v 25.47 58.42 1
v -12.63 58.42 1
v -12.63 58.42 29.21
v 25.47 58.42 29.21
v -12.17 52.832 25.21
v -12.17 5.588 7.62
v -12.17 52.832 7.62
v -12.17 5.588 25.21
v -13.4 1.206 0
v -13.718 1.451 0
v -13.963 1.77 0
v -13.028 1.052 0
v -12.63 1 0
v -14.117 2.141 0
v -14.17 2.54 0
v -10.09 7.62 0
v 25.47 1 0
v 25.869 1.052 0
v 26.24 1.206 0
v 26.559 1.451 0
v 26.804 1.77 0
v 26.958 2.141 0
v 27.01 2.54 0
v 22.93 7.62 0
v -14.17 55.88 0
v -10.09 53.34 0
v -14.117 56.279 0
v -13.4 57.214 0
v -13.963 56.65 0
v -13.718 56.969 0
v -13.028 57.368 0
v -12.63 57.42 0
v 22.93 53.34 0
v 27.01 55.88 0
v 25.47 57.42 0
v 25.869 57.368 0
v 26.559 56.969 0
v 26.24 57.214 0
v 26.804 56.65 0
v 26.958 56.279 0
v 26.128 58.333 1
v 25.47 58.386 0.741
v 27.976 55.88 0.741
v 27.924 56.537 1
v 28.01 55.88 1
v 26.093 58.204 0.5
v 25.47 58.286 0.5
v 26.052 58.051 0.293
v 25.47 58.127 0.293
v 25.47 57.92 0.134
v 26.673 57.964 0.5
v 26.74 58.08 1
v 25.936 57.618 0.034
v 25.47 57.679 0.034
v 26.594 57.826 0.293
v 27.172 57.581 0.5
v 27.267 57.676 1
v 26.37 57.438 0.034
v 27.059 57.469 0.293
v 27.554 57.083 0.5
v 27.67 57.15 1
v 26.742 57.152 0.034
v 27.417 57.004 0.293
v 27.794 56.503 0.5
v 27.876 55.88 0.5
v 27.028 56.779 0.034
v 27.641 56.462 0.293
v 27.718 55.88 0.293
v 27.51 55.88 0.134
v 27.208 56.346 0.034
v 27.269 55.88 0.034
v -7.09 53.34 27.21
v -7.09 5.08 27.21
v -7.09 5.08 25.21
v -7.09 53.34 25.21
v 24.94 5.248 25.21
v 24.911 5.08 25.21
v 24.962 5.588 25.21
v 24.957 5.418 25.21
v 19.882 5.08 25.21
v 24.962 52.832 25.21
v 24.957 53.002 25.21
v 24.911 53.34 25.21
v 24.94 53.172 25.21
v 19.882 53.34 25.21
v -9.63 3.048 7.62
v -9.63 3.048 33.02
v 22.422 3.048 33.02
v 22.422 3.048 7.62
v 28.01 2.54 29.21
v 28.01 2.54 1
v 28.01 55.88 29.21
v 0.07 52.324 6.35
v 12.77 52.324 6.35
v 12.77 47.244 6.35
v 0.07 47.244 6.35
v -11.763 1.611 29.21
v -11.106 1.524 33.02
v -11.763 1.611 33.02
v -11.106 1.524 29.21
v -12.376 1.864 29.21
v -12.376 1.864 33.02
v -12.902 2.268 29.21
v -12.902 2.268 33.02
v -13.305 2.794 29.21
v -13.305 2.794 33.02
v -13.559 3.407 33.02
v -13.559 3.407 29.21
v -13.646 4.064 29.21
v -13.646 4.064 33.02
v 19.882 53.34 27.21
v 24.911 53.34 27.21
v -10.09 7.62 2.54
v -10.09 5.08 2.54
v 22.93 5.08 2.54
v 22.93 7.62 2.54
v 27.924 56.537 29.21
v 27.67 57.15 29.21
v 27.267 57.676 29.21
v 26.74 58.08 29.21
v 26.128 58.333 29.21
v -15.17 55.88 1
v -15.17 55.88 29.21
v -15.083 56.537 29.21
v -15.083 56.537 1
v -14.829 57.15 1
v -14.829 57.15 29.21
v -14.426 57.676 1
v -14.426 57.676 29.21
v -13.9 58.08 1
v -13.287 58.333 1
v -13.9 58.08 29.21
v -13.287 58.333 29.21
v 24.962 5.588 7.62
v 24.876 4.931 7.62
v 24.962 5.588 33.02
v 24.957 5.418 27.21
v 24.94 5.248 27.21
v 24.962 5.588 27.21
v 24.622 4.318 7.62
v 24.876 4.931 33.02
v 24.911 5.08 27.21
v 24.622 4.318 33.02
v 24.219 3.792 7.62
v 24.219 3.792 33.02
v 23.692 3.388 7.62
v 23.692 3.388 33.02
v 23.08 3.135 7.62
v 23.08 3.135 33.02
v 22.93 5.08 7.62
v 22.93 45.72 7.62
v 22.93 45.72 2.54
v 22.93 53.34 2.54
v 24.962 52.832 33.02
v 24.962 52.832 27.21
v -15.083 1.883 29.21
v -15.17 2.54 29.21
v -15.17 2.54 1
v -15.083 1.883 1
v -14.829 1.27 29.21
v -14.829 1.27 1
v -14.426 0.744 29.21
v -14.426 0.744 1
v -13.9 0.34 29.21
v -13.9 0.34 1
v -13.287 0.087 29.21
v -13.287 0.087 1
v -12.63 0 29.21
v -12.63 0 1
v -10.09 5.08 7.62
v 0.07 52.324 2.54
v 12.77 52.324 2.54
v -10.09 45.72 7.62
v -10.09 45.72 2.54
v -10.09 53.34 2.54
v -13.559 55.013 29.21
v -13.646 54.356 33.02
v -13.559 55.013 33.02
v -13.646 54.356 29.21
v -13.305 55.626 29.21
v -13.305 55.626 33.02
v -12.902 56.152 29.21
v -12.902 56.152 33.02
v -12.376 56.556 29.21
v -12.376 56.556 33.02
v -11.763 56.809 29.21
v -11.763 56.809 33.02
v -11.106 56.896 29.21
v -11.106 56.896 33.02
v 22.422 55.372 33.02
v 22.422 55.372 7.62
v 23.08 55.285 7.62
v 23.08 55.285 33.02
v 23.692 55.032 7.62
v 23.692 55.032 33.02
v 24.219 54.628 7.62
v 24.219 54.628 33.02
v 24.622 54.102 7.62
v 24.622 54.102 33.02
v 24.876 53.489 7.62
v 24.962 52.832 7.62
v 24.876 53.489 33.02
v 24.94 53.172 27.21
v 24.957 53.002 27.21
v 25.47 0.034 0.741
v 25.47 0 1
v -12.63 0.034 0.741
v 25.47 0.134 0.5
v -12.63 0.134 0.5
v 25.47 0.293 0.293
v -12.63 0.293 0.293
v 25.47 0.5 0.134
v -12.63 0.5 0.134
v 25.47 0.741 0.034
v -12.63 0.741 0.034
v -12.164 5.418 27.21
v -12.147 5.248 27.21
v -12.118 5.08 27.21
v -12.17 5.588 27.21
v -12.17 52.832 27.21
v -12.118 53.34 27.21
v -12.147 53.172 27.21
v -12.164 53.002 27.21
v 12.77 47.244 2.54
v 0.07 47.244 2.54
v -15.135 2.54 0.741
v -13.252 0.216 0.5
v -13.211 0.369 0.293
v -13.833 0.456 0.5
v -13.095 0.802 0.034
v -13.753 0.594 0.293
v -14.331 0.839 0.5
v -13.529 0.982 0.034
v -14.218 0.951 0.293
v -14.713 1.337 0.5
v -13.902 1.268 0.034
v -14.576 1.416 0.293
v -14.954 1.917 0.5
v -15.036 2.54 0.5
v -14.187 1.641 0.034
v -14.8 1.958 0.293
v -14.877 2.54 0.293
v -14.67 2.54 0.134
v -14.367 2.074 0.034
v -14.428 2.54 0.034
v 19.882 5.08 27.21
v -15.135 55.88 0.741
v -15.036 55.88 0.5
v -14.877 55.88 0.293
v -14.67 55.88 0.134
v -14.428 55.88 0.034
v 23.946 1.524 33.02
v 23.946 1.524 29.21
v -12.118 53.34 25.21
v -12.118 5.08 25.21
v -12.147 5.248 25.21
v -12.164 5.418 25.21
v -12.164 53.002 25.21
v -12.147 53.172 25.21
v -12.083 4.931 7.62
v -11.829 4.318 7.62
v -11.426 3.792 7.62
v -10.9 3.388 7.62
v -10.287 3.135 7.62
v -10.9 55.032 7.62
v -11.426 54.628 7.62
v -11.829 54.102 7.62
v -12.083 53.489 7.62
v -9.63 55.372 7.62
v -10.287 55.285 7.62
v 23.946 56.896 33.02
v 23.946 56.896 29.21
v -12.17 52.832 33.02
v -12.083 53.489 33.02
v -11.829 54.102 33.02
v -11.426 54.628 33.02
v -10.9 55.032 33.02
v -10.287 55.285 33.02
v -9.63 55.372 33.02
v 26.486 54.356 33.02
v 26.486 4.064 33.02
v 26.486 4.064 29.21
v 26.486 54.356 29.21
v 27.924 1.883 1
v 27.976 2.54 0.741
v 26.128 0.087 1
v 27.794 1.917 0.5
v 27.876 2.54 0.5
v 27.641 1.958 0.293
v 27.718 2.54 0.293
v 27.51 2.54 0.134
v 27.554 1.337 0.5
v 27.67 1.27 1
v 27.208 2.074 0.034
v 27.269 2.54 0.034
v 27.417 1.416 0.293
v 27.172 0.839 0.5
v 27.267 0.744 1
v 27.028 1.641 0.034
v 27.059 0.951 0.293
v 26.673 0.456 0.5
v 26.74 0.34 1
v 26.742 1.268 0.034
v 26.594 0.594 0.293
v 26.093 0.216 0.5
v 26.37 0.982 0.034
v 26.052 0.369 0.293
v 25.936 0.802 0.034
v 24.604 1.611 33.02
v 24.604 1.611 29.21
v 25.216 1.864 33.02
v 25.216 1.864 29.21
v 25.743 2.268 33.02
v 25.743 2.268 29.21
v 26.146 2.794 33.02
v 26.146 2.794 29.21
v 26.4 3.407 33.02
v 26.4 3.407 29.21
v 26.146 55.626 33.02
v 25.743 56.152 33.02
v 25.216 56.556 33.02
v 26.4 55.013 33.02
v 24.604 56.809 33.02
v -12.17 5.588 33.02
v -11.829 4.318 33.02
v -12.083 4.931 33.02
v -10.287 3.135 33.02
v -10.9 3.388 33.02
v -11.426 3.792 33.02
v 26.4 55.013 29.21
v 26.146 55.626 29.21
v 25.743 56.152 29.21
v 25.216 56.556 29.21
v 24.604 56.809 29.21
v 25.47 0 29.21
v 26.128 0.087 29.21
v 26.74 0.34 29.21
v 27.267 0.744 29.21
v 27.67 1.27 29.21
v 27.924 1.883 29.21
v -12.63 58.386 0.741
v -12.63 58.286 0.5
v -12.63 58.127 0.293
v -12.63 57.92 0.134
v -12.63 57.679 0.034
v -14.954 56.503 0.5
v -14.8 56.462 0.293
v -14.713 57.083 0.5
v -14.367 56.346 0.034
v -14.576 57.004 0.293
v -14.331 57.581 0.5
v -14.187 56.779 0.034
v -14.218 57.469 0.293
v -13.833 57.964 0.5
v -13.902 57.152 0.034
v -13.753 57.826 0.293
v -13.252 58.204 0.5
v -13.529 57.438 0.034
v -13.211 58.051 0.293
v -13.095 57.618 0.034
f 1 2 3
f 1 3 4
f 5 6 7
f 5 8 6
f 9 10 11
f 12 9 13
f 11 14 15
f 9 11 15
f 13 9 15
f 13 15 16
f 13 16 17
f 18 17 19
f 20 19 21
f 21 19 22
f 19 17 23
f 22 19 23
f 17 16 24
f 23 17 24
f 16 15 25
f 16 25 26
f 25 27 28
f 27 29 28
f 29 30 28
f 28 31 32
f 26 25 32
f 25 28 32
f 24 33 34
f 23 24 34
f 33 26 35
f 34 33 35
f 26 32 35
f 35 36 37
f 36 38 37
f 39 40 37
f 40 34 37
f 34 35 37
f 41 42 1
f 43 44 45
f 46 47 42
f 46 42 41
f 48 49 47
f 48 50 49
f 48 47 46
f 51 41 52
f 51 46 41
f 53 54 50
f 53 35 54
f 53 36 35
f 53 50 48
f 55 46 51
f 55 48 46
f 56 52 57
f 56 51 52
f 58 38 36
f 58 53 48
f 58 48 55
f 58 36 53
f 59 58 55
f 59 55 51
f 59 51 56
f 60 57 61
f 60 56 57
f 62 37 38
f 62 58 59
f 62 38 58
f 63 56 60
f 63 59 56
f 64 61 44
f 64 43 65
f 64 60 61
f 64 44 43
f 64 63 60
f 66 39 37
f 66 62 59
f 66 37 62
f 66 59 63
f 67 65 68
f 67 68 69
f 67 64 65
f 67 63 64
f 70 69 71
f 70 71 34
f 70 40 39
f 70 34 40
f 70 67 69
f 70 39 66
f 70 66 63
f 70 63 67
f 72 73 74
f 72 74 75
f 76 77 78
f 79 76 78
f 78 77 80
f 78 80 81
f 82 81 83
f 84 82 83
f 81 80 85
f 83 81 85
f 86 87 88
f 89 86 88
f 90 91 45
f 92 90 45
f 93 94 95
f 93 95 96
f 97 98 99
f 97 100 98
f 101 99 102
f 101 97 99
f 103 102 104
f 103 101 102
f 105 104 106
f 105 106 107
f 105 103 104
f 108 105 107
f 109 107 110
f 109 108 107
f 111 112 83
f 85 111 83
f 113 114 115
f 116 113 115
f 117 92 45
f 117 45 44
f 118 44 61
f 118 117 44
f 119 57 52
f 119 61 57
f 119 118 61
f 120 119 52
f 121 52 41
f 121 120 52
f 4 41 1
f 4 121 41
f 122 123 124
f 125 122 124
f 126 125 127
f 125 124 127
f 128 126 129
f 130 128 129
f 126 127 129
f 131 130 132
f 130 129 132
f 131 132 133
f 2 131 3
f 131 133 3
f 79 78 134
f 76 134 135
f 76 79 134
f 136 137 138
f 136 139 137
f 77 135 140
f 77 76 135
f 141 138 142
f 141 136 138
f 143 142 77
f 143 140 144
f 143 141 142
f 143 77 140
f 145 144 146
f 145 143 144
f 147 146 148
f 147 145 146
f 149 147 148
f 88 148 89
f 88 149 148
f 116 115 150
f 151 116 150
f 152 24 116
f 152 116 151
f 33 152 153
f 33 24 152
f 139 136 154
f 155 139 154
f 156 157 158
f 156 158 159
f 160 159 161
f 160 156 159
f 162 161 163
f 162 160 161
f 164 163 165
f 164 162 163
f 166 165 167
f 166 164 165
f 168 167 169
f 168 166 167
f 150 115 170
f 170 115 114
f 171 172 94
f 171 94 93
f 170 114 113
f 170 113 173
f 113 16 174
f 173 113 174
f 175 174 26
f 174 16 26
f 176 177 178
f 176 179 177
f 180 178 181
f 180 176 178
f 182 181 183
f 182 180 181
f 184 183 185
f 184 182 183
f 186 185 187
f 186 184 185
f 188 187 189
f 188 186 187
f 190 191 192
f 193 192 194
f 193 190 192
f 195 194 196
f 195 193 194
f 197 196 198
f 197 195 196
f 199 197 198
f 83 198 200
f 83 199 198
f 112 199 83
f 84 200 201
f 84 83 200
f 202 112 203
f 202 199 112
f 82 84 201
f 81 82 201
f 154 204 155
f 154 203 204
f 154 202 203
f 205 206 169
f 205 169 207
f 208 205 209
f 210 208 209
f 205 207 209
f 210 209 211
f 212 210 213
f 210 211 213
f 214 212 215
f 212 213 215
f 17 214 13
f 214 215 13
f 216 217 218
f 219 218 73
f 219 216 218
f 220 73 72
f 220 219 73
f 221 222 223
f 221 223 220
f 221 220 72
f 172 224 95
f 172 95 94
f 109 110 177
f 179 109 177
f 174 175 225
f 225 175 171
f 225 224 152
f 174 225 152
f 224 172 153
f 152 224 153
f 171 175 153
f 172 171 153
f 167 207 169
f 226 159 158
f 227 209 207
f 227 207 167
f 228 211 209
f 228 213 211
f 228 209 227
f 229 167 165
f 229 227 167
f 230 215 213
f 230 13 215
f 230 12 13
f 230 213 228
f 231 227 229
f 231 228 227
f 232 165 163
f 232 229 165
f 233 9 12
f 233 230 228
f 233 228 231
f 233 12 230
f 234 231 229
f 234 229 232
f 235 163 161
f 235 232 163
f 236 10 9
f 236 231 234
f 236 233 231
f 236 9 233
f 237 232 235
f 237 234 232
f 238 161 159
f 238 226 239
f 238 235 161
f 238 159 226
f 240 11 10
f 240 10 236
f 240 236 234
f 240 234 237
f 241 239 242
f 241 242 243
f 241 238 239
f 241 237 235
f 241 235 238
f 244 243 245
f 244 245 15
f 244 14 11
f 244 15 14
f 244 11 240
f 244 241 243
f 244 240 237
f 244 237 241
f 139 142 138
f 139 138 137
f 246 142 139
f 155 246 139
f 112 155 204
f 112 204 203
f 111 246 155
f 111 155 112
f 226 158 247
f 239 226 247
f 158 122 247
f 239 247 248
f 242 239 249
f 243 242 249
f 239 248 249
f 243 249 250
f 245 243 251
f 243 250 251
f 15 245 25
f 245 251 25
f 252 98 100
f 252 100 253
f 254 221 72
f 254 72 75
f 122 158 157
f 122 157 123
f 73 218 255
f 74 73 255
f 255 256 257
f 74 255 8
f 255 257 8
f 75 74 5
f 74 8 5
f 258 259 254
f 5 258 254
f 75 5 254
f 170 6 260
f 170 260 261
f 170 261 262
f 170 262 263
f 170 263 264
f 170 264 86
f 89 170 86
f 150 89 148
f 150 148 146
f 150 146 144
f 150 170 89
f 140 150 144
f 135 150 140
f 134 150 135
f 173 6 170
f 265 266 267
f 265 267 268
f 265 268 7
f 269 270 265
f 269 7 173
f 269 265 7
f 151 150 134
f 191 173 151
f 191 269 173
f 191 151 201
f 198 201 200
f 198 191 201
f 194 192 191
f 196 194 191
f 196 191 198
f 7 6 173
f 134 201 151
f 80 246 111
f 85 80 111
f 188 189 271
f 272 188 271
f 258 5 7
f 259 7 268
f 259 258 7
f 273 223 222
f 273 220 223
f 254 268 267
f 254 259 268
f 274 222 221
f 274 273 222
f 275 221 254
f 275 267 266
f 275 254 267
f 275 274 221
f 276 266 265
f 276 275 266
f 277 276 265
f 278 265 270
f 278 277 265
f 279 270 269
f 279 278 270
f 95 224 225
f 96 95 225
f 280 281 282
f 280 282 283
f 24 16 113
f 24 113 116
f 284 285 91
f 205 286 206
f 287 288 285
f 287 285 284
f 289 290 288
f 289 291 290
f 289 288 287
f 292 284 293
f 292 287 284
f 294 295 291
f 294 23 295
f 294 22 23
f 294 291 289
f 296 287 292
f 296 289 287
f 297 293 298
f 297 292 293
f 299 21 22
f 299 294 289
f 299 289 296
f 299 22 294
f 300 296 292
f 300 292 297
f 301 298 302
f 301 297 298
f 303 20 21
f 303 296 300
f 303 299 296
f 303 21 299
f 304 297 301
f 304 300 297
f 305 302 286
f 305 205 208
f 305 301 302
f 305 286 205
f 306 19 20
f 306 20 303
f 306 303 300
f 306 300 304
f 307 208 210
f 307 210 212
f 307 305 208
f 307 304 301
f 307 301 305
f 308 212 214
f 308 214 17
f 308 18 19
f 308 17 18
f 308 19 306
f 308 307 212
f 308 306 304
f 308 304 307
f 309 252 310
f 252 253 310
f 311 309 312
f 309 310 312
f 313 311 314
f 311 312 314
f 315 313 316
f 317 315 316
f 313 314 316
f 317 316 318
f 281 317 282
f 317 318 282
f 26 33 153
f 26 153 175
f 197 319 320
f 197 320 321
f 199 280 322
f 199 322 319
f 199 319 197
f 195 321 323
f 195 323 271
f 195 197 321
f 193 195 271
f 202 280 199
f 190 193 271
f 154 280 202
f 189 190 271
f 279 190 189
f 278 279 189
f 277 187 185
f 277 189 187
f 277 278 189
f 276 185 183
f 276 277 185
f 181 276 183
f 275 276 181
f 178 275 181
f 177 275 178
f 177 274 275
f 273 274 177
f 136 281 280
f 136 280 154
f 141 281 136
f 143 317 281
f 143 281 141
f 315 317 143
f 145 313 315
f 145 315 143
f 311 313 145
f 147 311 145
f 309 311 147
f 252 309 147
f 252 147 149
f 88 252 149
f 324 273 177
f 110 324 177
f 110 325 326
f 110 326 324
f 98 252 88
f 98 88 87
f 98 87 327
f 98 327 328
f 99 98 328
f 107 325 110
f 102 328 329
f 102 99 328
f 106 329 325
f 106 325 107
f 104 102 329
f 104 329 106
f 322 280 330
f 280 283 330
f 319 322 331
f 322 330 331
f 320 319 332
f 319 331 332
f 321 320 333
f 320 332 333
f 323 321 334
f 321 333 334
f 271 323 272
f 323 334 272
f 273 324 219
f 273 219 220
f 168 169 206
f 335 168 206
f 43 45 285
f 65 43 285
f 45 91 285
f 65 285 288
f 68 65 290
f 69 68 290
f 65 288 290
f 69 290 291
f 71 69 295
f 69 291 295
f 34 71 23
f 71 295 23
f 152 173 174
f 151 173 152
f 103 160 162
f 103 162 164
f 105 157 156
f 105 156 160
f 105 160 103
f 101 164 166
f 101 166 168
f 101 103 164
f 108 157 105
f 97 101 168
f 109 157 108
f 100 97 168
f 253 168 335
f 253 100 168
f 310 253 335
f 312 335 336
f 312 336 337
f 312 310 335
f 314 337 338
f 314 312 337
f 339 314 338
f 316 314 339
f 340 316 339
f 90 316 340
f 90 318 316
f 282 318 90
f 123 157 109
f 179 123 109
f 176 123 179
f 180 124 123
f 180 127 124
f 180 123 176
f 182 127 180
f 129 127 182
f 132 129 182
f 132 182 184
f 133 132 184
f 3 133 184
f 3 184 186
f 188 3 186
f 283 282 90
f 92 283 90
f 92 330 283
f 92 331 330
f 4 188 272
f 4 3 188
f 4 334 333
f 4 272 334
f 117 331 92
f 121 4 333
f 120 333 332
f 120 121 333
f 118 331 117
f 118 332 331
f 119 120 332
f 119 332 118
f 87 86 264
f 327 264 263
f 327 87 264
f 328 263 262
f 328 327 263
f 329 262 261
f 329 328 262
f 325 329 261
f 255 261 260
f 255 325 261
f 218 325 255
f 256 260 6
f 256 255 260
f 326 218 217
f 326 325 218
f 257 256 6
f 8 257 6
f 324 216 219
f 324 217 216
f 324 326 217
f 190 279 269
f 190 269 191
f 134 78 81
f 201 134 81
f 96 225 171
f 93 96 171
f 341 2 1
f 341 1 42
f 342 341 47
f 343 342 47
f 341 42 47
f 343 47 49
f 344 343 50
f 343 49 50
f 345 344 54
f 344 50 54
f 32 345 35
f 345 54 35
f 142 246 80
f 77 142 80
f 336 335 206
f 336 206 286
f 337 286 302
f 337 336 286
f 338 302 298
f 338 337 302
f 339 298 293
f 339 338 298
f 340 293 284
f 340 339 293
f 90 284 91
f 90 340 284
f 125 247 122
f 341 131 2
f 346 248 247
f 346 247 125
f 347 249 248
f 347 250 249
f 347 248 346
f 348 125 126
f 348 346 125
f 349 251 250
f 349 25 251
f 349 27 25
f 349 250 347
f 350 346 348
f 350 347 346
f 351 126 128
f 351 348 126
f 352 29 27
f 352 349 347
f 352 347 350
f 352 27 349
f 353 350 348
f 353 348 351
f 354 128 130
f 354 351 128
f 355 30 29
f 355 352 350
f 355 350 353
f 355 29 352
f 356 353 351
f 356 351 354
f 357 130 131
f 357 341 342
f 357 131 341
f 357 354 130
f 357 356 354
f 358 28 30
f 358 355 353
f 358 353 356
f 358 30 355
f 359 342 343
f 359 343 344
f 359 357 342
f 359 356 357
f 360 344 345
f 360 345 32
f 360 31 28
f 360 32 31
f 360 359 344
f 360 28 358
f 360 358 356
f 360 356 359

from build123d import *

# Parameters (mm, degrees)
SKETCH1_W           = 43.18
SKETCH1_H           = 58.42
BOSS_EXTRUDE1_DEPTH = 33.02
SKETCH2_W           = 37.132
SKETCH2_H           = 52.324
CUT_EXTRUDE1_DEPTH  = 25.4
SKETCH2_6_W         = 43.18
SKETCH2_6_H         = 58.42
SKETCH2_6_W_2       = 40.132
SKETCH2_6_H_2       = 55.372
CUT_EXTRUDE3_DEPTH  = 3.81
SKETCH5_W           = 2
SKETCH5_H           = 48.26
BOSS_EXTRUDE2_DEPTH = 38.1
SKETCH6_W           = 26.972
SKETCH6_H           = 48.26
CUT_EXTRUDE4_DEPTH  = 7.62
SKETCH8_W           = 33.02
SKETCH8_H           = 48.26
CUT_EXTRUDE5_DEPTH  = 7.62
SKETCH9_W           = 33.02
SKETCH9_H           = 2.54
BOSS_EXTRUDE3_DEPTH = 2.54
SKETCH11_W          = 33.02
SKETCH11_H          = 5.08
BOSS_EXTRUDE4_DEPTH = 7.62
SKETCH12_W          = 12.7
SKETCH12_H          = 5.08
CUT_EXTRUDE6_DEPTH  = 3.81
FILLET1_R           = 2.54
FILLET2_R           = 2.54
FILLET3_R           = 2.54
FILLET4_R           = 2.54
FILLET5_R           = 1


with BuildPart() as part:
    # Sketch1 → Boss-Extrude1 (new body)
    with BuildSketch(Plane.XY):
        with Locations((6.420456459, 29.21)):
            Rectangle(SKETCH1_W, SKETCH1_H)
    extrude(amount=BOSS_EXTRUDE1_DEPTH)

    # Sketch2 → Cut-Extrude1 (cut)
    with BuildSketch(Plane.XY.offset(33.02)):
        with Locations((6.396456459, 29.21)):
            Rectangle(SKETCH2_W, SKETCH2_H)
    extrude(amount=-CUT_EXTRUDE1_DEPTH, mode=Mode.SUBTRACT)

    # Sketch2<6> → Cut-Extrude3 (cut)
    with BuildSketch(Plane.XY.offset(33.02)):
        with Locations((6.420456459, 29.21)):
            Rectangle(SKETCH2_6_W, SKETCH2_6_H)
        with Locations((6.420456459, 29.21)):
            Rectangle(SKETCH2_6_W_2, SKETCH2_6_H_2, mode=Mode.SUBTRACT)
    extrude(amount=-CUT_EXTRUDE3_DEPTH, mode=Mode.SUBTRACT)

    # Sketch5 → Boss-Extrude2 (add)
    with BuildSketch(Plane(origin=(-12.169543541, 0, 0), x_dir=(0, 0, -1), z_dir=(1, 0, 0))):
        with Locations((-26.21, 29.21)):
            Rectangle(SKETCH5_W, SKETCH5_H)
    extrude(amount=BOSS_EXTRUDE2_DEPTH)

    # Sketch6 → Cut-Extrude4 (cut)
    with BuildSketch(Plane.XY.offset(27.21)):
        with Locations((6.396456459, 29.21)):
            Rectangle(SKETCH6_W, SKETCH6_H)
    extrude(amount=-CUT_EXTRUDE4_DEPTH, mode=Mode.SUBTRACT)

    # Sketch8 → Cut-Extrude5 (cut)
    with BuildSketch(Plane(origin=(0, 0, 0), x_dir=(-1, 0, 0), z_dir=(0, 0, -1))):
        with Locations((-6.420456459, 29.21)):
            Rectangle(SKETCH8_W, SKETCH8_H)
    extrude(amount=-CUT_EXTRUDE5_DEPTH, mode=Mode.SUBTRACT)

    # Sketch9 → Boss-Extrude3 (add)
    with BuildSketch(Plane(origin=(0, 5.08, 0), x_dir=(1, 0, 0), z_dir=(0, 1, 0))):
        with Locations((6.420456459, -1.27)):
            Rectangle(SKETCH9_W, SKETCH9_H)
    extrude(amount=BOSS_EXTRUDE3_DEPTH)

    # Sketch11 → Boss-Extrude4 (add)
    with BuildSketch(Plane.XZ.offset(-53.34)):
        with Locations((6.420456459, 5.08)):
            Rectangle(SKETCH11_W, SKETCH11_H)
    extrude(amount=BOSS_EXTRUDE4_DEPTH)

    # Sketch12 → Cut-Extrude6 (cut)
    with BuildSketch(Plane(origin=(0, 0, 2.54), x_dir=(-1, 0, 0), z_dir=(0, 0, -1))):
        with Locations((-6.420456459, 49.784)):
            Rectangle(SKETCH12_W, SKETCH12_H)
    extrude(amount=-CUT_EXTRUDE6_DEPTH, mode=Mode.SUBTRACT)

    # Fillet1
    # the kernel refuses this fillet: 2.54 mm, written as the material it adds along each edge
    with BuildSketch(Plane(origin=(-12.169543541, 3.048, 33.02), x_dir=(1, 0, 0), z_dir=(0, 0, -1)), Plane(origin=(24.962456459, 55.372, 33.02), x_dir=(-1, 0, 0), z_dir=(0, 0, -1)), Plane(origin=(24.962456459, 3.048, 33.02), x_dir=(0, 1, 0), z_dir=(0, 0, -1))) as fillet1_piece_1:
        with BuildLine():
            CenterArc((FILLET1_R, -FILLET1_R), FILLET1_R, 90, 90)
            Line((0, -FILLET1_R), (0, 0))
            Line((0, 0), (FILLET1_R, 0))
        make_face()
    extrude(amount=31.75)
    with BuildSketch(Plane(origin=(-12.169543541, 55.372, 33.02), x_dir=(1, 0, 0), z_dir=(0, 0, -1))) as fillet1_piece_2:
        with BuildLine():
            CenterArc((FILLET1_R, FILLET1_R), FILLET1_R, 180, 90)
            Line((0, FILLET1_R), (0, 0))
            Line((0, 0), (FILLET1_R, 0))
        make_face()
    extrude(amount=31.75)

    # Fillet2
    fillet2_edges = [part.edges().sort_by_distance(p)[0] for p in [
        (-15.169543541, 58.42, 14.605),
        (28.010456459, 58.42, 14.605),
        (26.486456459, 56.896, 31.115),
        (-13.645543541, 56.896, 31.115),
    ]]
    fillet(fillet2_edges, radius=FILLET2_R)

    # Fillet3
    fillet3_edges = [part.edges().sort_by_distance(p)[0] for p in [
        (-15.169543541, 0, 14.605),
        (-13.645543541, 1.524, 31.115),
    ]]
    fillet(fillet3_edges, radius=FILLET3_R)

    # Fillet4
    fillet4_edges = [part.edges().sort_by_distance(p)[0] for p in [
        (28.010456459, 0, 14.605),
        (26.486456459, 1.524, 31.115),
    ]]
    fillet(fillet4_edges, radius=FILLET4_R)

    # Fillet5
    fillet5_edges = [part.edges().sort_by_distance(p)[0] for p in [
        (-15.169543541, 29.21, 0),
        (6.420456459, 58.42, 0),
        (27.266507683, 57.676051224, 0),
        (-14.425594766, 57.676051224, 0),
        (6.420456459, 0, 0),
        (-14.425594766, 0.743948776, 0),
        (28.010456459, 29.21, 0),
        (27.266507683, 0.743948776, 0),
    ]]
    fillet(fillet5_edges, radius=FILLET5_R)


solid = part.part
